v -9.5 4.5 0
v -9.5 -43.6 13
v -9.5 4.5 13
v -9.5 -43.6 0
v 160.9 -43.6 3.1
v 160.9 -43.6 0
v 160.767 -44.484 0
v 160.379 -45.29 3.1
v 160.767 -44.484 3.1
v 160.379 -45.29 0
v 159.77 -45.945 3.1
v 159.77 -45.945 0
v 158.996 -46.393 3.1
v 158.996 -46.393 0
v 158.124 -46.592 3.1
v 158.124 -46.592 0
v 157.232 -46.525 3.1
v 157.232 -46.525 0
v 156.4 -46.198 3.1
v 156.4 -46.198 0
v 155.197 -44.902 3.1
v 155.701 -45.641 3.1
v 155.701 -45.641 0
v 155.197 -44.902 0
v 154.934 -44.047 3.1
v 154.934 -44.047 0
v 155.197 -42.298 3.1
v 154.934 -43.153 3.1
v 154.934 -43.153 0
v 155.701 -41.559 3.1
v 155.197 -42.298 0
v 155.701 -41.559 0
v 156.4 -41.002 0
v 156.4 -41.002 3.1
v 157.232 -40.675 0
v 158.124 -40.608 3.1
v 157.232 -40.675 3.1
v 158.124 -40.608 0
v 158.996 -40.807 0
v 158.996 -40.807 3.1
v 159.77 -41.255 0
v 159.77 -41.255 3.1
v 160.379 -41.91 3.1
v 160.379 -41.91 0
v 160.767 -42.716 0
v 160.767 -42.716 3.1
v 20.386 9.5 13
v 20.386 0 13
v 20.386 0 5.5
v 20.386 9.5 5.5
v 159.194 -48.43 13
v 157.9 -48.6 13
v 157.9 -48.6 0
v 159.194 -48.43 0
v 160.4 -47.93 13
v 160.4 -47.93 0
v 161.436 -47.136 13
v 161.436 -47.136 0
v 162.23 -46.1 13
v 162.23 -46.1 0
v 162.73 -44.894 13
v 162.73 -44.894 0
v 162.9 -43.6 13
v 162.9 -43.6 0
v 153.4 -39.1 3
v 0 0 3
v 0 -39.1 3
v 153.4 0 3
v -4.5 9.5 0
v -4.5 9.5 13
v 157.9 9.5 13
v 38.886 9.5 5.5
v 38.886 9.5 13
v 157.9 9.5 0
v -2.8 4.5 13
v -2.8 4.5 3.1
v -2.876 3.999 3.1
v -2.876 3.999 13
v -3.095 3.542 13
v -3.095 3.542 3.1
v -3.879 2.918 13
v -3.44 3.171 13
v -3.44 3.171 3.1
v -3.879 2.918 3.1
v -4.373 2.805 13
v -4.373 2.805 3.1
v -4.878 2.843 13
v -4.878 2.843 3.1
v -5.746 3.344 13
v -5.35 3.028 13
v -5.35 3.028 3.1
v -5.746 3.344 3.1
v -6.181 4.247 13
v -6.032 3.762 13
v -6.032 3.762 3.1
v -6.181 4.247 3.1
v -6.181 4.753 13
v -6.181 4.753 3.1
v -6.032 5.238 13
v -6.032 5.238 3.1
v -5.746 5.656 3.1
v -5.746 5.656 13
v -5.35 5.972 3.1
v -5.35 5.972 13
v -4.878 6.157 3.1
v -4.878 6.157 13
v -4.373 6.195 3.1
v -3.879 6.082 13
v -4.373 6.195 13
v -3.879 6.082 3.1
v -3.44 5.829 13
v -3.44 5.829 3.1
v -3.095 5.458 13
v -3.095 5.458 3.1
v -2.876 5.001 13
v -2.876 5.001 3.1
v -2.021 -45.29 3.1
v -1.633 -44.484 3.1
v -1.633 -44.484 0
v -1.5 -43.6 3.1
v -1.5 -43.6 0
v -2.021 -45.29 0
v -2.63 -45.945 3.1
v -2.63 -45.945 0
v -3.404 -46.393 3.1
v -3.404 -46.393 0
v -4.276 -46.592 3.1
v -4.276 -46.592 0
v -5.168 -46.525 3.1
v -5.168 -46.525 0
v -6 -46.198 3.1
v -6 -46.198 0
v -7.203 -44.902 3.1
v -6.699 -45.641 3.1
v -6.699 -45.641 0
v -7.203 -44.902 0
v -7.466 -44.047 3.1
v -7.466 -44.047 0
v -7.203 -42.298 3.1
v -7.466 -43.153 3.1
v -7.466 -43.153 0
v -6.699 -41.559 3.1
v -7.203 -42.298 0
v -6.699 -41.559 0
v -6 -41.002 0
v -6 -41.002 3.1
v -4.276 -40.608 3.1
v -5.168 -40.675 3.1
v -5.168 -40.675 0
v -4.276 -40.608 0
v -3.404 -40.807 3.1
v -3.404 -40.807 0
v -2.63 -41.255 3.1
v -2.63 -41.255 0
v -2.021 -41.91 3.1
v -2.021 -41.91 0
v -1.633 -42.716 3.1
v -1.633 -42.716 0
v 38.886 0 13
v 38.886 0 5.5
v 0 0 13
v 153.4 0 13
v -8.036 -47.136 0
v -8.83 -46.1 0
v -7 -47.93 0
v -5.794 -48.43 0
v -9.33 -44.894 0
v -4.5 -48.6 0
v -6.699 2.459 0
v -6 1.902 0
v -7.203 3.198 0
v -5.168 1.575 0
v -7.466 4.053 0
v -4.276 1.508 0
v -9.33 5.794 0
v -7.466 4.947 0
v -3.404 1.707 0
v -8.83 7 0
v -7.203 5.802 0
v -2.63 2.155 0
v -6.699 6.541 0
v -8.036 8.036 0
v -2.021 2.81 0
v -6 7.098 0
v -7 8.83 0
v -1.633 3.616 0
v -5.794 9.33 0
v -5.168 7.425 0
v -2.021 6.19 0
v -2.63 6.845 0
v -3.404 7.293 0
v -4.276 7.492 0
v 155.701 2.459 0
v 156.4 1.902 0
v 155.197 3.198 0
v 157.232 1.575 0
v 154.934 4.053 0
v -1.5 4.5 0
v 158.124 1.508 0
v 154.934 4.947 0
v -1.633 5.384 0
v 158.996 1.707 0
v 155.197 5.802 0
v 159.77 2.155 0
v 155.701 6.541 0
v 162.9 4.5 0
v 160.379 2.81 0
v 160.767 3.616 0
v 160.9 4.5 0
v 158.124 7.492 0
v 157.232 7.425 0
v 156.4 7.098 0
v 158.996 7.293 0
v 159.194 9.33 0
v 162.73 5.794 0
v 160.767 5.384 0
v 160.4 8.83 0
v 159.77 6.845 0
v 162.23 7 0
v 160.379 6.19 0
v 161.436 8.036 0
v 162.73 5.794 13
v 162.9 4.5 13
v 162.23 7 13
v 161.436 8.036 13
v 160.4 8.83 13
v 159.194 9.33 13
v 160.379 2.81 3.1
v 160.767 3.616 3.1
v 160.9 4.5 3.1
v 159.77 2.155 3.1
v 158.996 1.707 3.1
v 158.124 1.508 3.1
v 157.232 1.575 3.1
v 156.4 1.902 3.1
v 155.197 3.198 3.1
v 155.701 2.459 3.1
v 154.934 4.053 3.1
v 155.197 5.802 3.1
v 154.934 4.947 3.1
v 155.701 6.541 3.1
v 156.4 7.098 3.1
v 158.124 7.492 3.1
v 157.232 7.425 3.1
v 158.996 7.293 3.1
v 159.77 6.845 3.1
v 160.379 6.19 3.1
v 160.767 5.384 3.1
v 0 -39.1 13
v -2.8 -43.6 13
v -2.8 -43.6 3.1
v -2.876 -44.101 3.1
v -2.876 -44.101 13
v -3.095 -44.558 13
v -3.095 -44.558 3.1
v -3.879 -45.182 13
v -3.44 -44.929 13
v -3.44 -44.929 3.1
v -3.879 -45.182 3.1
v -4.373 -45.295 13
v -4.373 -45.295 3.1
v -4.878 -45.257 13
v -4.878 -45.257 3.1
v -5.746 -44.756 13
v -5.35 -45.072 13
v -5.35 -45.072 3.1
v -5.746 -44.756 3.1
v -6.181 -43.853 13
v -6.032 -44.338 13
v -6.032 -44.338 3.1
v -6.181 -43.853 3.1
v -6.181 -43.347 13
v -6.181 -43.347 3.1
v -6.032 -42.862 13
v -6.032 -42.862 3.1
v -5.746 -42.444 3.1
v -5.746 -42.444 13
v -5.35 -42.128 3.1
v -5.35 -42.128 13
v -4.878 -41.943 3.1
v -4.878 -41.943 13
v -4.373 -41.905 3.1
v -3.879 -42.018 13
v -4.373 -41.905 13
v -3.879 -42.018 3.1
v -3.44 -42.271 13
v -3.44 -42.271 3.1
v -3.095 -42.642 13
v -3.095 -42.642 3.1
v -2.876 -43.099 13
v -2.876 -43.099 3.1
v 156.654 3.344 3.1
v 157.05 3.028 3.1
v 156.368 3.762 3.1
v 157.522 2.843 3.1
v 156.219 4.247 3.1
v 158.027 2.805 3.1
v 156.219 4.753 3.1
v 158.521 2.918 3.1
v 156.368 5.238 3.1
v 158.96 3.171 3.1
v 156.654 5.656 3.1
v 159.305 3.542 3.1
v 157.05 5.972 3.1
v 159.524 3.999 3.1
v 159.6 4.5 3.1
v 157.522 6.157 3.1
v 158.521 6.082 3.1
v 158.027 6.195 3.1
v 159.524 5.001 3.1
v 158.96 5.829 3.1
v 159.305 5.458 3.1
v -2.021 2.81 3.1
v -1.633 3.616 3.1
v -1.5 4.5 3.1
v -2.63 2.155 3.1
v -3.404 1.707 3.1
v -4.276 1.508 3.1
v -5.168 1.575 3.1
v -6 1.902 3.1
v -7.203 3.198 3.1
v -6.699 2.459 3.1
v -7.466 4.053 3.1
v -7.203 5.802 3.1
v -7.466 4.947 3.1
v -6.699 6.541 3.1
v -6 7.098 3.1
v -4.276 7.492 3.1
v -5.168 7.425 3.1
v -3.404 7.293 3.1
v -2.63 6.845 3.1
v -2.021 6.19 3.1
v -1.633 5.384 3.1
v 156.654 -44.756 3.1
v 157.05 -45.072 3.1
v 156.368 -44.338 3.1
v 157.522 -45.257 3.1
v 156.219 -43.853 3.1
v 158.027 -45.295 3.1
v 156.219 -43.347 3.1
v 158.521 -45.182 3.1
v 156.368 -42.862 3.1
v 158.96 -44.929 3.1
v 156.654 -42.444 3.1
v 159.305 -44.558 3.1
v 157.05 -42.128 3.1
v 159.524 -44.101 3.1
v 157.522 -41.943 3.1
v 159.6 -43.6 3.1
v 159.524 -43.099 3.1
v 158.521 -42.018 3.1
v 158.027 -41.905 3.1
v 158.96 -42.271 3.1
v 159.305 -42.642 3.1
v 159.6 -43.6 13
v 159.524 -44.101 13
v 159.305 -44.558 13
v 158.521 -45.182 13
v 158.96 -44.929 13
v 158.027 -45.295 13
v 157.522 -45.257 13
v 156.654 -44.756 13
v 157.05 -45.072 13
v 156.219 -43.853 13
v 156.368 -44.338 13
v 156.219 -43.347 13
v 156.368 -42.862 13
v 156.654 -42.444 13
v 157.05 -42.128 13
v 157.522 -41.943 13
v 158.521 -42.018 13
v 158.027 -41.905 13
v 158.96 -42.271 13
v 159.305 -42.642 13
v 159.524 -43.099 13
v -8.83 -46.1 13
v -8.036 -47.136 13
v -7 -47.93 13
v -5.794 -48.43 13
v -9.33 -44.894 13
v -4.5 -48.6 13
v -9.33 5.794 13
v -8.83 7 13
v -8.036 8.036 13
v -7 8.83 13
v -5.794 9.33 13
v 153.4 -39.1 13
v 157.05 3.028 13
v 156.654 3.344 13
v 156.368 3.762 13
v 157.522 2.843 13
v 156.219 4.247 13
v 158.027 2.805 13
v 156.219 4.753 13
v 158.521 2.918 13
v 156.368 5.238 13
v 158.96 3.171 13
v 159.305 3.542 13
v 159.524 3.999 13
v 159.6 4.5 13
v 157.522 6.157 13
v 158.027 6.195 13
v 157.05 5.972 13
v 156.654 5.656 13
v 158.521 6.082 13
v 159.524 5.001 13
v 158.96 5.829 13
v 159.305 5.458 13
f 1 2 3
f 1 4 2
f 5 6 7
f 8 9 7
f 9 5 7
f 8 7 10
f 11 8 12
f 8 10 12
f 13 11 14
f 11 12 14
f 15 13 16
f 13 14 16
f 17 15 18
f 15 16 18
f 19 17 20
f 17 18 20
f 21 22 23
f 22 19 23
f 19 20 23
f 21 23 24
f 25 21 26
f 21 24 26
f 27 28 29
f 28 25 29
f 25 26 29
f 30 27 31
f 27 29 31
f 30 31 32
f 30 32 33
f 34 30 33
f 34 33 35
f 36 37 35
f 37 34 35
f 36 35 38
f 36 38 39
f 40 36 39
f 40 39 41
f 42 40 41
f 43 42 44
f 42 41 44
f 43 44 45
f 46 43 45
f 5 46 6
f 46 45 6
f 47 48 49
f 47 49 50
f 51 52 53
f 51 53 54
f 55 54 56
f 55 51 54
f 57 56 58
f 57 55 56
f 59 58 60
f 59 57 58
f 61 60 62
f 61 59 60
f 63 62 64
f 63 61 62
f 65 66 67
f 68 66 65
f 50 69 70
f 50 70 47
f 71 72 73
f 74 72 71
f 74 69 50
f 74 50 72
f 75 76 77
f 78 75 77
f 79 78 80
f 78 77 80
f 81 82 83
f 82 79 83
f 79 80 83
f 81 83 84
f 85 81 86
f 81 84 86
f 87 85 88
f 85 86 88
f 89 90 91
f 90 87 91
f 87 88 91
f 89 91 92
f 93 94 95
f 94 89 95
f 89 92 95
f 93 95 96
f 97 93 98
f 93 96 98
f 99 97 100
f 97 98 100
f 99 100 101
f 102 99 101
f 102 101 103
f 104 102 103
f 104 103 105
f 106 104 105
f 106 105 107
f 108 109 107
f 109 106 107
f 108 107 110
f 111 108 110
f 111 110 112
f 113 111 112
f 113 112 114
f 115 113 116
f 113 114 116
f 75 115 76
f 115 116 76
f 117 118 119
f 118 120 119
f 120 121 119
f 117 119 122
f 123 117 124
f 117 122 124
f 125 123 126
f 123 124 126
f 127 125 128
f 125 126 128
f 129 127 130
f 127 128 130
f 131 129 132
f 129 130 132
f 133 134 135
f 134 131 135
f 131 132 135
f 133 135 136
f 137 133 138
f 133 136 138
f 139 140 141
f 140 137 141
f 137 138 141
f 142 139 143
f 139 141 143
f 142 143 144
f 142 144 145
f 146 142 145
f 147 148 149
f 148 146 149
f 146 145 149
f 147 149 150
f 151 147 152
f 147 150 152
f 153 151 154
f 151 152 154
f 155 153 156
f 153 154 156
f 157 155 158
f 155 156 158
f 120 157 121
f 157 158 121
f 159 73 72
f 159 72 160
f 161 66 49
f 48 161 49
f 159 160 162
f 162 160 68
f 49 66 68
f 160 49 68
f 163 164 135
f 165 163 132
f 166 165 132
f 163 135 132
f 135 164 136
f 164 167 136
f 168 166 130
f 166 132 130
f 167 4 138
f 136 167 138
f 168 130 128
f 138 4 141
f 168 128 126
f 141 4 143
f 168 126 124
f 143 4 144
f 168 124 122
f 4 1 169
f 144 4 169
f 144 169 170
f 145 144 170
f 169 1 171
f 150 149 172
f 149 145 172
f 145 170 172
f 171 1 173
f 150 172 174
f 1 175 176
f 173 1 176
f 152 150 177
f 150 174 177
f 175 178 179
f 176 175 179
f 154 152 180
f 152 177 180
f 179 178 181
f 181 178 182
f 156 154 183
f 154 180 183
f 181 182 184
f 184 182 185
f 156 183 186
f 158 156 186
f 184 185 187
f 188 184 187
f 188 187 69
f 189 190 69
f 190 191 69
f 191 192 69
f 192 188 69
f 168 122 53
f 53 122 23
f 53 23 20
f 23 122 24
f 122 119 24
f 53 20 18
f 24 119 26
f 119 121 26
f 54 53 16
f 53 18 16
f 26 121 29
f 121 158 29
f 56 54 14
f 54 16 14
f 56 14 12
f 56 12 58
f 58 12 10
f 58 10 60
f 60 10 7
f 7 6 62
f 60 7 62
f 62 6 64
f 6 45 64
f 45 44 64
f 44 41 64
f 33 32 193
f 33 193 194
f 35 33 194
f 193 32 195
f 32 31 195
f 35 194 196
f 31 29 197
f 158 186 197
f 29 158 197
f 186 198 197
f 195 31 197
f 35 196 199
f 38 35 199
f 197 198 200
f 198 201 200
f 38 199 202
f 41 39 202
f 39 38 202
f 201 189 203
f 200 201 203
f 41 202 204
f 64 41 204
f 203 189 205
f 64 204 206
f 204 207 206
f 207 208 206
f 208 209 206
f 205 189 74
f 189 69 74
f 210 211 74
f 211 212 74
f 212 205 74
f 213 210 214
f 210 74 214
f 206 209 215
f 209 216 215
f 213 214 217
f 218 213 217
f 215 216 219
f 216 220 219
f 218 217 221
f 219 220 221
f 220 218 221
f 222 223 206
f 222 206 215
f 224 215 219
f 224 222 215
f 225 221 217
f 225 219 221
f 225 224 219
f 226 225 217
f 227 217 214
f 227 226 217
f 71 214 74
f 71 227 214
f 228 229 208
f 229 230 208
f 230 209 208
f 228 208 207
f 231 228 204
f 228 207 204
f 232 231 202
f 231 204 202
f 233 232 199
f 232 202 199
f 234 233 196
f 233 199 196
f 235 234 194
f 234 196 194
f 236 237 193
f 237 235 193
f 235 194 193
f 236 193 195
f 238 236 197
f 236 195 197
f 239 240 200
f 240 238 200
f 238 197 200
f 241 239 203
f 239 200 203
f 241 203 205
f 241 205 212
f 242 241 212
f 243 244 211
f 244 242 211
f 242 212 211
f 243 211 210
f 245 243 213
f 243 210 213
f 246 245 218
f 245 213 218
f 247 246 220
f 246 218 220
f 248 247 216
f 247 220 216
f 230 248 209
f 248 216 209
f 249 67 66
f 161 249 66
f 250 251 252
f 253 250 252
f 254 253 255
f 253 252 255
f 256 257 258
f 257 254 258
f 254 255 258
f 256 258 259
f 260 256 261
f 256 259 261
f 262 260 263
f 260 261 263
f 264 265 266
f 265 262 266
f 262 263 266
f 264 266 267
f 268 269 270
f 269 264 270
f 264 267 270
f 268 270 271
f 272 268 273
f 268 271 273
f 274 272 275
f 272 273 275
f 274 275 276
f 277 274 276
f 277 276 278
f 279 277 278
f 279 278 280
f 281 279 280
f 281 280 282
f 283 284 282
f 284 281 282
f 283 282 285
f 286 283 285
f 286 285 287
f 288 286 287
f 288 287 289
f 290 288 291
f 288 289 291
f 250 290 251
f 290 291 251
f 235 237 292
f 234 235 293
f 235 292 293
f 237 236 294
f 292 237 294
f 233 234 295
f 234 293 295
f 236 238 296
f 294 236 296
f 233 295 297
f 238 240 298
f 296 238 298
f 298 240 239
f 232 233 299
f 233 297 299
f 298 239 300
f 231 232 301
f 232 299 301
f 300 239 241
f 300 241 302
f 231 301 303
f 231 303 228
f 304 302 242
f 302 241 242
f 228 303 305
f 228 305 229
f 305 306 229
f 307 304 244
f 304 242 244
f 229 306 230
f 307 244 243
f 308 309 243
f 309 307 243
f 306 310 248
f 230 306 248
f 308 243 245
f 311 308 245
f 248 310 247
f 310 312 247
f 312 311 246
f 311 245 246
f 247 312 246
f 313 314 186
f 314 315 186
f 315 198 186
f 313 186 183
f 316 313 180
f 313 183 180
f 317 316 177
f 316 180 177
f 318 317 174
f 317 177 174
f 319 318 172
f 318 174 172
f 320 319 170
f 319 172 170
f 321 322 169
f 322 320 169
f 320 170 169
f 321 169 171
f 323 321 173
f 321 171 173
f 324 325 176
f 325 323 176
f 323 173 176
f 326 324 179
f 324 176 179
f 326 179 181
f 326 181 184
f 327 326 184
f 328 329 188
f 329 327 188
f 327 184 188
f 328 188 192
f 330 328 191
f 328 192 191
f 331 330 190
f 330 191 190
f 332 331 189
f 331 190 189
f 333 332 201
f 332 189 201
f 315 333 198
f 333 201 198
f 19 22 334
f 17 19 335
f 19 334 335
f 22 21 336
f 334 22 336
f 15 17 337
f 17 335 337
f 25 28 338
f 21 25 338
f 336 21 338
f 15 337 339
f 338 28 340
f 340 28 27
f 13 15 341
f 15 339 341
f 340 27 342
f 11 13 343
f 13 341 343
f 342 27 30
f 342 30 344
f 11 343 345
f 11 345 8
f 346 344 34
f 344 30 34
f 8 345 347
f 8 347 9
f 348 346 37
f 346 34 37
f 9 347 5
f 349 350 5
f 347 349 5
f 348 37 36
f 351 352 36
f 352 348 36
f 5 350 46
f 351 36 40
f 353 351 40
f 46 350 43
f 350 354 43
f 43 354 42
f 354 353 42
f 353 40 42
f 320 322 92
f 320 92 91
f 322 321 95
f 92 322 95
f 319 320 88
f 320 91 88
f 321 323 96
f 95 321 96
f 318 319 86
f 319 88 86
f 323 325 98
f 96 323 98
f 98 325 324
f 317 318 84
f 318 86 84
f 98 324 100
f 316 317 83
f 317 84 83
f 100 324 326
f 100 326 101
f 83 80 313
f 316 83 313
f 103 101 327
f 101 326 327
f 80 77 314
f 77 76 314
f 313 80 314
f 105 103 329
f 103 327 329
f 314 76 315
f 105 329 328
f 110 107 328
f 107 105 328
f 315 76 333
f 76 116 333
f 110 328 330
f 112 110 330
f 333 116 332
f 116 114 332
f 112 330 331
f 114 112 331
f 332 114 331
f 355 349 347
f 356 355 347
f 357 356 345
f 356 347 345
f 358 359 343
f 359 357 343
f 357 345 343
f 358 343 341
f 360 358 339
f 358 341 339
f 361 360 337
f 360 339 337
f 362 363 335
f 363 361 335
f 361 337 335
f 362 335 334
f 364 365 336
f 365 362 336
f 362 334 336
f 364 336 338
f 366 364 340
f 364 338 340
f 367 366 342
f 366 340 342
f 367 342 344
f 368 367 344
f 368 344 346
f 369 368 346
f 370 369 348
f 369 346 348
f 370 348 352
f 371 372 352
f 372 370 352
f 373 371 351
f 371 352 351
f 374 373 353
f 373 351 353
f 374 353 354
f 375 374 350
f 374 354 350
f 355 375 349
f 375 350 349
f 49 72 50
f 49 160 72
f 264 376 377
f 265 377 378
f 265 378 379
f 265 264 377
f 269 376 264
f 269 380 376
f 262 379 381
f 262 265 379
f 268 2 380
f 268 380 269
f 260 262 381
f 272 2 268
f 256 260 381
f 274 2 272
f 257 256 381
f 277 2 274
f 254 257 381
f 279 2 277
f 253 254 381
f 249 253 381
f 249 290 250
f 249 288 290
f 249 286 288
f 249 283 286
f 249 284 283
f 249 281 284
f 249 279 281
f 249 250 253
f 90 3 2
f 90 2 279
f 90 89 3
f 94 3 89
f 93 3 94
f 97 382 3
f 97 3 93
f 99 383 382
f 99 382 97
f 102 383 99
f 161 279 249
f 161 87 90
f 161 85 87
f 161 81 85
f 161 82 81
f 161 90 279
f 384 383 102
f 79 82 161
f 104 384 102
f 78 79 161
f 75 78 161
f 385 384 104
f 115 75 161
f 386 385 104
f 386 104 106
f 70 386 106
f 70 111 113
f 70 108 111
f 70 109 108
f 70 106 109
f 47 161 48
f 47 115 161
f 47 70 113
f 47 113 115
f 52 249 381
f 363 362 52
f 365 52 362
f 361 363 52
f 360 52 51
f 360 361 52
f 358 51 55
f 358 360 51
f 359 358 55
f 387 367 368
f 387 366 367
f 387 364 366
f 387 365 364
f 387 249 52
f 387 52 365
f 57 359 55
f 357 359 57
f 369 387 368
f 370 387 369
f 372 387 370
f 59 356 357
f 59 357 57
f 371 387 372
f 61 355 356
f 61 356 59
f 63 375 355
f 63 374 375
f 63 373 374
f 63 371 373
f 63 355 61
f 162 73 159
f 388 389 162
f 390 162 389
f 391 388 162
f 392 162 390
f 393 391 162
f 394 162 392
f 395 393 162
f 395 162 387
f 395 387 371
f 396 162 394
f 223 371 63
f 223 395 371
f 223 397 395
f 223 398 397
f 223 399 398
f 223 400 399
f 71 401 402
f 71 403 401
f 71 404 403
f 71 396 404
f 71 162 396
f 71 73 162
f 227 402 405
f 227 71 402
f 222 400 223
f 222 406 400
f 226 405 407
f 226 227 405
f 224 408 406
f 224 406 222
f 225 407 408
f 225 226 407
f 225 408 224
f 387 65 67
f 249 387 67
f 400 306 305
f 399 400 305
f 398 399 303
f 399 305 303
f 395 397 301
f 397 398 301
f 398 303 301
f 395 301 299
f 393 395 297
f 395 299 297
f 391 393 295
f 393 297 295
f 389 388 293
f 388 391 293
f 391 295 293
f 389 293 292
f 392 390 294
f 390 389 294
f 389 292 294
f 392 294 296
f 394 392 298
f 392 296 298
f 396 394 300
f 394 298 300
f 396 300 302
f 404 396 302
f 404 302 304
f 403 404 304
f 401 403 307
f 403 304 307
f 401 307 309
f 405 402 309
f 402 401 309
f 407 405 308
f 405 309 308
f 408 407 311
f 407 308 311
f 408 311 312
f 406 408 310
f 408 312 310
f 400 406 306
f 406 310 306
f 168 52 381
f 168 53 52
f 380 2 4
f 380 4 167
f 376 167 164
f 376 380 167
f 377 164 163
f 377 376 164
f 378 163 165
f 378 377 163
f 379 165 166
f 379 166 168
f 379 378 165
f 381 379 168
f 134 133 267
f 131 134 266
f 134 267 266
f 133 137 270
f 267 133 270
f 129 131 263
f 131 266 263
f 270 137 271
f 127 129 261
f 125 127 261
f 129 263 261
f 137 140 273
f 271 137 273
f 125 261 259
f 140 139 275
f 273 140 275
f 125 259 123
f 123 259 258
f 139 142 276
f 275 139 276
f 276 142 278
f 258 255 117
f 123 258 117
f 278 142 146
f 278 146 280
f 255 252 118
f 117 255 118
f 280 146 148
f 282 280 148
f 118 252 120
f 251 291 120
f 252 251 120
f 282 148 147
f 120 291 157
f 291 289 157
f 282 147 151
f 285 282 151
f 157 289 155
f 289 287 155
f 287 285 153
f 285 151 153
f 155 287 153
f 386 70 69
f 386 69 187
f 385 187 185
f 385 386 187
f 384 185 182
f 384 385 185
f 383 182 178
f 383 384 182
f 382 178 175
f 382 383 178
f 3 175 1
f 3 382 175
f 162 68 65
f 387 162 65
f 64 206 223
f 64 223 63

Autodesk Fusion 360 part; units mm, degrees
sketch "Sketch1" plane through (0, 0, 0) normal (0, 0, 1) x (1, 0, 0)
  line L0 (0, 0) -> (153.4, 0)
  line L1 (153.4, 0) -> (153.4, -39.1)
  line L2 (153.4, -39.1) -> (0, -39.1)
  line L3 (0, -39.1) -> (0, 0)
  line L4 (-9.5, 9.5) -> (162.9, 9.5)
  line L5 (162.9, 9.5) -> (162.9, -48.6)
  line L6 (162.9, -48.6) -> (-9.5, -48.6)
  line L7 (-9.5, -48.6) -> (-9.5, 9.5)
  circle A0 centre (-4.5, 4.5) radius 1.7
  circle A1 centre (-4.5, -43.6) radius 1.7
  circle A2 centre (-4.5, -43.6) radius 3
  circle A3 centre (-4.5, 4.5) radius 3
  circle A4 centre (157.9, 4.5) radius 1.7
  circle A5 centre (157.9, 4.5) radius 3
  circle A6 centre (157.9, -43.6) radius 1.7
  circle A7 centre (157.9, -43.6) radius 3
  dimension "d1" = 153.4
  dimension "d2" = 39.1
  dimension "d3" = 172.4
  dimension "d4" = 58.1
  dimension "d5" = 9.5
  dimension "d6" = 9.5
  dimension "d7" = 3.4
  dimension "d8" = 5
  dimension "d9" = 5
  dimension "d10" = 3.4
  dimension "d11" = 5
  dimension "d12" = 5
  dimension "d13" = 6
  dimension "d14" = 6
  dimension "d15" = 3.4
  dimension "d16" = 5
  dimension "d17" = 5
  dimension "d18" = 6
  dimension "d19" = 3.4
  dimension "d20" = 5
  dimension "d21" = 5
  dimension "d22" = 6
extrude "Extrude1" add sketch "Sketch1" along normal blind 9.9 from surface at 3.1 contours A2 | A3 | A5 | A7 makes body 1 at (-1.5037, 4.3505, 9.7) makes body 2 at (160.1981, 6.4284, 9.7) makes body 3 at (-1.5037, -43.7495, 9.7) makes body 4 at (159.9947, -41.4524, 9.7)
extrude "Extrude2" add sketch "Sketch1" along normal blind 13 contours L4 L5 L6 L7 bodies 1 2 3 4
extrude "Extrude3" add sketch "Sketch1" along normal blind 3 contours L0 L1 L2 L3 bodies 1
sketch "Sketch2" plane through (0, 0, 13) normal (0, 0, 1) x (-1, 0, 0)
  circle A0 centre (4.5, -4.5) radius 1.7
  circle A1 centre (-157.9, 43.6) radius 1.7
  line L0 (-153.4, 39.1) -> (0, 39.1)
  line L1 (0, 39.1) -> (0, 0)
  line L2 (0, 0) -> (-153.4, 0)
  line L3 (-153.4, 0) -> (-153.4, 39.1)
  line L4 (9.5, 48.6) -> (-162.9, 48.6)
  line L5 (-162.9, 48.6) -> (-162.9, -9.5)
  line L6 (-162.9, -9.5) -> (9.5, -9.5)
  line L7 (9.5, -9.5) -> (9.5, 48.6)
  circle A2 centre (-157.9, -4.5) radius 1.7
  circle A3 centre (4.5, 43.6) radius 1.7
  line L8 (-20.386, -9.5) -> (-38.886, -9.5)
  line L9 (-38.886, -9.5) -> (-38.886, 0)
  line L10 (-38.886, 0) -> (-20.386, 0)
  line L11 (-20.386, 0) -> (-20.386, -9.5)
  dimension "d30" = 18.5
  dimension "d31" = 29.886
extrude "Extrude4" cut sketch "Sketch2" against normal blind 7.5 contours L2 L6 L8 L9 L10 L11 bodies 1
fillet "Fillet1" radius 5 4 edges at (-9.5, -48.6, 6.5) (-9.5, 9.5, 6.5) (162.9, 9.5, 6.5) (162.9, -48.6, 6.5) on bodies 1
